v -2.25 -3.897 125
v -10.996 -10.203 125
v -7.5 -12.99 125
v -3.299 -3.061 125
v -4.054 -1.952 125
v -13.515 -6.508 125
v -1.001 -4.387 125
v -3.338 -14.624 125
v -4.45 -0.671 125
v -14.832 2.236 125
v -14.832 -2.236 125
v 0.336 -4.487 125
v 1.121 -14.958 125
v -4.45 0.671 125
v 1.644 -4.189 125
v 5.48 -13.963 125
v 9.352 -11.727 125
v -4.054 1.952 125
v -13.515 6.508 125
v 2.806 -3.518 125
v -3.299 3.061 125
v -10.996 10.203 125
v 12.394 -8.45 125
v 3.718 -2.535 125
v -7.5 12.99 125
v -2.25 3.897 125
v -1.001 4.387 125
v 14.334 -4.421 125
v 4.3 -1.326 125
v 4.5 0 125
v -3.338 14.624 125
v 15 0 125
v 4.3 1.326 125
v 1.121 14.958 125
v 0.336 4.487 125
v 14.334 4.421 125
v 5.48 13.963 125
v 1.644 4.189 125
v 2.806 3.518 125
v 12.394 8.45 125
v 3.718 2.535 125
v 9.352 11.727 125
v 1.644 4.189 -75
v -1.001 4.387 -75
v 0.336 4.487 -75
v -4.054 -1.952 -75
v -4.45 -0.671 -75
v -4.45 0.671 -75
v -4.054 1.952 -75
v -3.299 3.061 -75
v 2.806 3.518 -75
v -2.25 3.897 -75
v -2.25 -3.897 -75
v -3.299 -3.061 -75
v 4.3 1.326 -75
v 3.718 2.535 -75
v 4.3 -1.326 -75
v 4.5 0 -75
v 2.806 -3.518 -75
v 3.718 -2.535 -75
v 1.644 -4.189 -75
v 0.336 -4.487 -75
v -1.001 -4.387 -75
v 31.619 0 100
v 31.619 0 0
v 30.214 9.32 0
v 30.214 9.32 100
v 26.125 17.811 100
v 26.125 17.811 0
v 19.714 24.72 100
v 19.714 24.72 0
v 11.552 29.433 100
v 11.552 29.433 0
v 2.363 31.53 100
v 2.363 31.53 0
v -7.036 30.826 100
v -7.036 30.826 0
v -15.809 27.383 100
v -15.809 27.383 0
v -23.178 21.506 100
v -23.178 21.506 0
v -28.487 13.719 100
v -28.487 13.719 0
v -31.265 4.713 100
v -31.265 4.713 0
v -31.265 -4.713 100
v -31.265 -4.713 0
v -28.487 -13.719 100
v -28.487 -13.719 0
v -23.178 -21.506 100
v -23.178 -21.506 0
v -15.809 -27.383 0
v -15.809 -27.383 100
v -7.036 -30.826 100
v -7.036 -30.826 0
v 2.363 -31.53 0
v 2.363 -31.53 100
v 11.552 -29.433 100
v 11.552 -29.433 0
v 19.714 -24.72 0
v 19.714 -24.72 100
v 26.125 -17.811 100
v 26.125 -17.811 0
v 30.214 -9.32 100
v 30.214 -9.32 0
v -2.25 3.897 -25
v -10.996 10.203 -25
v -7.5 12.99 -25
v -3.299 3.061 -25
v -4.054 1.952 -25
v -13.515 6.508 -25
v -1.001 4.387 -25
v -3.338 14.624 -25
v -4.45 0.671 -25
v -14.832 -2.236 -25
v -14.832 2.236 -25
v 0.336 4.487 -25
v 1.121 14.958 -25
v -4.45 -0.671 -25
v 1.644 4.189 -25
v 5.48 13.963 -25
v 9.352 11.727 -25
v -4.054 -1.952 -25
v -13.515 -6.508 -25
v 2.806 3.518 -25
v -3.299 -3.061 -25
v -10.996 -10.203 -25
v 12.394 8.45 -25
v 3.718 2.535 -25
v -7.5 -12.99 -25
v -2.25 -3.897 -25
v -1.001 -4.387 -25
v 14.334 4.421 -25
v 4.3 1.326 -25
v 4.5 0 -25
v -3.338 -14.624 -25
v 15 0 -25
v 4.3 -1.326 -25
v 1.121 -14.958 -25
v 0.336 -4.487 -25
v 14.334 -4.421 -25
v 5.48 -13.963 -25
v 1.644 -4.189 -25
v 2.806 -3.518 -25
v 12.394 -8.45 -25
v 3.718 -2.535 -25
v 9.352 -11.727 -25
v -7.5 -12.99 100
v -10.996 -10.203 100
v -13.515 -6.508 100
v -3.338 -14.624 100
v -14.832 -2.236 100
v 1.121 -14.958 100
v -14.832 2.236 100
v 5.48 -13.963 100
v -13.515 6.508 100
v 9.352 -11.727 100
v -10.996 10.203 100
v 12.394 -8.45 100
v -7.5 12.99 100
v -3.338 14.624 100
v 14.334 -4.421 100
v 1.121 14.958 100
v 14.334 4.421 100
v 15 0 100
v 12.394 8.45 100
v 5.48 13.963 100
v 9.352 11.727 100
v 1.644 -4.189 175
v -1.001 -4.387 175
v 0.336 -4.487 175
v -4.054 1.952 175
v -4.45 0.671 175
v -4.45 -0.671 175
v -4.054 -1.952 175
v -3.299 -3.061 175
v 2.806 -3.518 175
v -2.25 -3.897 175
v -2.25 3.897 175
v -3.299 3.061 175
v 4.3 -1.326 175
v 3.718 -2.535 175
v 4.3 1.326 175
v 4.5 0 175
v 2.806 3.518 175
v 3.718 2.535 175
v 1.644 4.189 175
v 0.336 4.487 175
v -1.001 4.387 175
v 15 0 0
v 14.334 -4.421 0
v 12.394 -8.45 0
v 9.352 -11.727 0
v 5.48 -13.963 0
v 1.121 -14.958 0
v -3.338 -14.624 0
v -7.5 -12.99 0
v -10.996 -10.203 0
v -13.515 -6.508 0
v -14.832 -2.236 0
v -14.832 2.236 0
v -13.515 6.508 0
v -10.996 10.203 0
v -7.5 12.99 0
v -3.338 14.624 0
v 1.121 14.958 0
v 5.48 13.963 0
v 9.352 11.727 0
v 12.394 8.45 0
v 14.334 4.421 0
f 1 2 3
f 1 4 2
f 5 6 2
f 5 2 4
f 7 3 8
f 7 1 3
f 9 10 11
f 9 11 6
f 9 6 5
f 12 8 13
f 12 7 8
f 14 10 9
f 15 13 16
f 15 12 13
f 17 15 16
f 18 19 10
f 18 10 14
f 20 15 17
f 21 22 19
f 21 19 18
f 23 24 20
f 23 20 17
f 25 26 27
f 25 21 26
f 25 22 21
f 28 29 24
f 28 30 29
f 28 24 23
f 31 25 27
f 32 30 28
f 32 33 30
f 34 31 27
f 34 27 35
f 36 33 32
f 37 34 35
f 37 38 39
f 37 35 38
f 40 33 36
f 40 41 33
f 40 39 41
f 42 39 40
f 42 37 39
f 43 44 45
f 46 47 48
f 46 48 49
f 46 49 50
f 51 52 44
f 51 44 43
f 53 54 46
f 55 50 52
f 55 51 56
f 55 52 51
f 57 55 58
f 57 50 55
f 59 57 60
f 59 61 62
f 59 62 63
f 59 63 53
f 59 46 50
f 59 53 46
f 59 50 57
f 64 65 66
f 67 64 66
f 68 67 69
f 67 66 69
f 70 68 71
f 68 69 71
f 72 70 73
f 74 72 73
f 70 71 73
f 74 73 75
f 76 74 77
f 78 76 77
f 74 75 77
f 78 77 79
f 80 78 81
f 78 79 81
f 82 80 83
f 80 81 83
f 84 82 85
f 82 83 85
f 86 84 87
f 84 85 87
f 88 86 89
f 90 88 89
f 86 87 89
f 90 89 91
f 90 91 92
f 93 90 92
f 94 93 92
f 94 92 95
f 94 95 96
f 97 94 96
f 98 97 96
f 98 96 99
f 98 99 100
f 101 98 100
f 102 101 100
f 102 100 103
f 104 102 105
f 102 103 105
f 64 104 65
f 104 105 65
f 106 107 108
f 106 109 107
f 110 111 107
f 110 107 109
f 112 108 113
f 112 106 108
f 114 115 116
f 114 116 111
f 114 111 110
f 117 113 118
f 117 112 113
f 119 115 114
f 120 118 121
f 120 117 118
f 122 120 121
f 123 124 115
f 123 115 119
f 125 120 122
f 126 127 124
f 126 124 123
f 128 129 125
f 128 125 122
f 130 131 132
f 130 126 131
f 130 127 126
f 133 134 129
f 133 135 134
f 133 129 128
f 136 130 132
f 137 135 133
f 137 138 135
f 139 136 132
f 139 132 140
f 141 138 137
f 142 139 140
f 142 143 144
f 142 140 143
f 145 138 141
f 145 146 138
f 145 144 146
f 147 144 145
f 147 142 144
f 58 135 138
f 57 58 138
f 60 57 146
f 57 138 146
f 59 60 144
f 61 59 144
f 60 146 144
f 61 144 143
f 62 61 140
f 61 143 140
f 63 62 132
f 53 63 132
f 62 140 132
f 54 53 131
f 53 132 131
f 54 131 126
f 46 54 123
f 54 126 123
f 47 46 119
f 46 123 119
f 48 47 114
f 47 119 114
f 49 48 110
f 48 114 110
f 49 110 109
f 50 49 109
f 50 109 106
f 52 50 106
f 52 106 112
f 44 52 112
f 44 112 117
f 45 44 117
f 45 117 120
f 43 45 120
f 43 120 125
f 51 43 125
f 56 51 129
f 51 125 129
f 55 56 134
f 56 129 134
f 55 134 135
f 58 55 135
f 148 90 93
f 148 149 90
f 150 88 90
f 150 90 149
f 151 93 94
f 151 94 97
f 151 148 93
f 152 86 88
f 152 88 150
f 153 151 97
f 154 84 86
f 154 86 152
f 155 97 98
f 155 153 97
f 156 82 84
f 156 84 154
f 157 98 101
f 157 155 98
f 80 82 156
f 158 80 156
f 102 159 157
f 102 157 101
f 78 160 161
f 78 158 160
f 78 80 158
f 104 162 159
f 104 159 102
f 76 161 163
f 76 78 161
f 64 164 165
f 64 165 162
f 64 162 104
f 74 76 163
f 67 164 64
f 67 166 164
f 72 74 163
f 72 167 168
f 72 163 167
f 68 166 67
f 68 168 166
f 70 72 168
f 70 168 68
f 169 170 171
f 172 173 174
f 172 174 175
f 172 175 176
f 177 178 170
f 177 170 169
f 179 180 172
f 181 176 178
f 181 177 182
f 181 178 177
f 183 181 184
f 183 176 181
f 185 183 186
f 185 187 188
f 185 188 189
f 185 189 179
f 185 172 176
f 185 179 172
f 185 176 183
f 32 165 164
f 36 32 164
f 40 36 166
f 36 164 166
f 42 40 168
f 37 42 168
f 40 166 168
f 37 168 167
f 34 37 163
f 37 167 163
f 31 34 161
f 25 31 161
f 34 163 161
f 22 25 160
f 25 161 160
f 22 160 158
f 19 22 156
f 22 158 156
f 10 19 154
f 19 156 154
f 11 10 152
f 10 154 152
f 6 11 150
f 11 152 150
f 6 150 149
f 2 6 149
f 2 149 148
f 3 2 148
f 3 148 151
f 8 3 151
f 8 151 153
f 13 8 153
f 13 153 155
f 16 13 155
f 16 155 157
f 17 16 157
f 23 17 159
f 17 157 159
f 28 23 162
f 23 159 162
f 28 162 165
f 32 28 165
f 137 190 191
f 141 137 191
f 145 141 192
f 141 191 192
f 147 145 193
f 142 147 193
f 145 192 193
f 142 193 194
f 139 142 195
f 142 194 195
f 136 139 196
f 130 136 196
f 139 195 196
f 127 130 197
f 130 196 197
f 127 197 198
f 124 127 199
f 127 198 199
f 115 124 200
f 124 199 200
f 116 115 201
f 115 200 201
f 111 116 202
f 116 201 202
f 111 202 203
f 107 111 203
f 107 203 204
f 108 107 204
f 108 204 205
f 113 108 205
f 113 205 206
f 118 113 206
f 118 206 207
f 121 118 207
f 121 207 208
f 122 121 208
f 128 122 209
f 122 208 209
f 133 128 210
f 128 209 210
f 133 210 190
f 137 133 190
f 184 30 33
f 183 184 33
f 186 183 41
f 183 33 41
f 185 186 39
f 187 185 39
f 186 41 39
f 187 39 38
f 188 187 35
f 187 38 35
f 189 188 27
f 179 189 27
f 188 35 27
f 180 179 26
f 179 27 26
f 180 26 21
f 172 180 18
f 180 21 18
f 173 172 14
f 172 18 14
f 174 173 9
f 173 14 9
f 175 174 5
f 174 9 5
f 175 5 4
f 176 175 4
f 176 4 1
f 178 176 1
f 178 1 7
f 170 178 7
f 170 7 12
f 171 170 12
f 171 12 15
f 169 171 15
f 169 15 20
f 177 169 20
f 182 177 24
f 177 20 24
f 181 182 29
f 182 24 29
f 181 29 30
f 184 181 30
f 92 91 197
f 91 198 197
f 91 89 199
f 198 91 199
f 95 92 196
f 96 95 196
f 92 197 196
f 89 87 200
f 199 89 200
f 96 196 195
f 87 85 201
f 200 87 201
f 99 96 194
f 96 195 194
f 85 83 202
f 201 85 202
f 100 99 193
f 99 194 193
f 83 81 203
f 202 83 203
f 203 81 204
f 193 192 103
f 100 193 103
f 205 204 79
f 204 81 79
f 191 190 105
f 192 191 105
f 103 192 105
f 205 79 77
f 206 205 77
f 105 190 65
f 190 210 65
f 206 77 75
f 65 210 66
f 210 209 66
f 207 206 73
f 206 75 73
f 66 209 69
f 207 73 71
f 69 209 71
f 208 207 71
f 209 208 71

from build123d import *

# Parameters (mm, degrees)
F0_R     = 31.618646
F1_DEPTH = 100
F2_R     = 15
F3_DEPTH = 25
F4_R     = 4.5
F5_DEPTH = 50
F6_R     = 15
F7_DEPTH = 25
F8_R     = 4.5
F9_DEPTH = 50


with BuildPart() as f1:
    # F0 (on Top) → F1 (new body)
    with BuildSketch(Plane.XY):
        Circle(F0_R)
    extrude(amount=F1_DEPTH)

    # F2 (on face) → F3 (join)
    with BuildSketch(Plane(origin=(0, 0, 0), x_dir=(1, 0, 0), z_dir=(0, 0, -1))):
        Circle(F2_R)
    extrude(amount=F3_DEPTH)

    # F4 (on face) → F5 (join)
    with BuildSketch(Plane(origin=(0, 0, -25), x_dir=(1, 0, 0), z_dir=(0, 0, -1))):
        Circle(F4_R)
    extrude(amount=F5_DEPTH)

    # F6 (on face) → F7 (join)
    with BuildSketch(Plane.XY.offset(100)):
        Circle(F6_R)
    extrude(amount=F7_DEPTH)

    # F8 (on face) → F9 (join)
    with BuildSketch(Plane.XY.offset(125)):
        Circle(F8_R)
    extrude(amount=F9_DEPTH)


solid = f1.part
